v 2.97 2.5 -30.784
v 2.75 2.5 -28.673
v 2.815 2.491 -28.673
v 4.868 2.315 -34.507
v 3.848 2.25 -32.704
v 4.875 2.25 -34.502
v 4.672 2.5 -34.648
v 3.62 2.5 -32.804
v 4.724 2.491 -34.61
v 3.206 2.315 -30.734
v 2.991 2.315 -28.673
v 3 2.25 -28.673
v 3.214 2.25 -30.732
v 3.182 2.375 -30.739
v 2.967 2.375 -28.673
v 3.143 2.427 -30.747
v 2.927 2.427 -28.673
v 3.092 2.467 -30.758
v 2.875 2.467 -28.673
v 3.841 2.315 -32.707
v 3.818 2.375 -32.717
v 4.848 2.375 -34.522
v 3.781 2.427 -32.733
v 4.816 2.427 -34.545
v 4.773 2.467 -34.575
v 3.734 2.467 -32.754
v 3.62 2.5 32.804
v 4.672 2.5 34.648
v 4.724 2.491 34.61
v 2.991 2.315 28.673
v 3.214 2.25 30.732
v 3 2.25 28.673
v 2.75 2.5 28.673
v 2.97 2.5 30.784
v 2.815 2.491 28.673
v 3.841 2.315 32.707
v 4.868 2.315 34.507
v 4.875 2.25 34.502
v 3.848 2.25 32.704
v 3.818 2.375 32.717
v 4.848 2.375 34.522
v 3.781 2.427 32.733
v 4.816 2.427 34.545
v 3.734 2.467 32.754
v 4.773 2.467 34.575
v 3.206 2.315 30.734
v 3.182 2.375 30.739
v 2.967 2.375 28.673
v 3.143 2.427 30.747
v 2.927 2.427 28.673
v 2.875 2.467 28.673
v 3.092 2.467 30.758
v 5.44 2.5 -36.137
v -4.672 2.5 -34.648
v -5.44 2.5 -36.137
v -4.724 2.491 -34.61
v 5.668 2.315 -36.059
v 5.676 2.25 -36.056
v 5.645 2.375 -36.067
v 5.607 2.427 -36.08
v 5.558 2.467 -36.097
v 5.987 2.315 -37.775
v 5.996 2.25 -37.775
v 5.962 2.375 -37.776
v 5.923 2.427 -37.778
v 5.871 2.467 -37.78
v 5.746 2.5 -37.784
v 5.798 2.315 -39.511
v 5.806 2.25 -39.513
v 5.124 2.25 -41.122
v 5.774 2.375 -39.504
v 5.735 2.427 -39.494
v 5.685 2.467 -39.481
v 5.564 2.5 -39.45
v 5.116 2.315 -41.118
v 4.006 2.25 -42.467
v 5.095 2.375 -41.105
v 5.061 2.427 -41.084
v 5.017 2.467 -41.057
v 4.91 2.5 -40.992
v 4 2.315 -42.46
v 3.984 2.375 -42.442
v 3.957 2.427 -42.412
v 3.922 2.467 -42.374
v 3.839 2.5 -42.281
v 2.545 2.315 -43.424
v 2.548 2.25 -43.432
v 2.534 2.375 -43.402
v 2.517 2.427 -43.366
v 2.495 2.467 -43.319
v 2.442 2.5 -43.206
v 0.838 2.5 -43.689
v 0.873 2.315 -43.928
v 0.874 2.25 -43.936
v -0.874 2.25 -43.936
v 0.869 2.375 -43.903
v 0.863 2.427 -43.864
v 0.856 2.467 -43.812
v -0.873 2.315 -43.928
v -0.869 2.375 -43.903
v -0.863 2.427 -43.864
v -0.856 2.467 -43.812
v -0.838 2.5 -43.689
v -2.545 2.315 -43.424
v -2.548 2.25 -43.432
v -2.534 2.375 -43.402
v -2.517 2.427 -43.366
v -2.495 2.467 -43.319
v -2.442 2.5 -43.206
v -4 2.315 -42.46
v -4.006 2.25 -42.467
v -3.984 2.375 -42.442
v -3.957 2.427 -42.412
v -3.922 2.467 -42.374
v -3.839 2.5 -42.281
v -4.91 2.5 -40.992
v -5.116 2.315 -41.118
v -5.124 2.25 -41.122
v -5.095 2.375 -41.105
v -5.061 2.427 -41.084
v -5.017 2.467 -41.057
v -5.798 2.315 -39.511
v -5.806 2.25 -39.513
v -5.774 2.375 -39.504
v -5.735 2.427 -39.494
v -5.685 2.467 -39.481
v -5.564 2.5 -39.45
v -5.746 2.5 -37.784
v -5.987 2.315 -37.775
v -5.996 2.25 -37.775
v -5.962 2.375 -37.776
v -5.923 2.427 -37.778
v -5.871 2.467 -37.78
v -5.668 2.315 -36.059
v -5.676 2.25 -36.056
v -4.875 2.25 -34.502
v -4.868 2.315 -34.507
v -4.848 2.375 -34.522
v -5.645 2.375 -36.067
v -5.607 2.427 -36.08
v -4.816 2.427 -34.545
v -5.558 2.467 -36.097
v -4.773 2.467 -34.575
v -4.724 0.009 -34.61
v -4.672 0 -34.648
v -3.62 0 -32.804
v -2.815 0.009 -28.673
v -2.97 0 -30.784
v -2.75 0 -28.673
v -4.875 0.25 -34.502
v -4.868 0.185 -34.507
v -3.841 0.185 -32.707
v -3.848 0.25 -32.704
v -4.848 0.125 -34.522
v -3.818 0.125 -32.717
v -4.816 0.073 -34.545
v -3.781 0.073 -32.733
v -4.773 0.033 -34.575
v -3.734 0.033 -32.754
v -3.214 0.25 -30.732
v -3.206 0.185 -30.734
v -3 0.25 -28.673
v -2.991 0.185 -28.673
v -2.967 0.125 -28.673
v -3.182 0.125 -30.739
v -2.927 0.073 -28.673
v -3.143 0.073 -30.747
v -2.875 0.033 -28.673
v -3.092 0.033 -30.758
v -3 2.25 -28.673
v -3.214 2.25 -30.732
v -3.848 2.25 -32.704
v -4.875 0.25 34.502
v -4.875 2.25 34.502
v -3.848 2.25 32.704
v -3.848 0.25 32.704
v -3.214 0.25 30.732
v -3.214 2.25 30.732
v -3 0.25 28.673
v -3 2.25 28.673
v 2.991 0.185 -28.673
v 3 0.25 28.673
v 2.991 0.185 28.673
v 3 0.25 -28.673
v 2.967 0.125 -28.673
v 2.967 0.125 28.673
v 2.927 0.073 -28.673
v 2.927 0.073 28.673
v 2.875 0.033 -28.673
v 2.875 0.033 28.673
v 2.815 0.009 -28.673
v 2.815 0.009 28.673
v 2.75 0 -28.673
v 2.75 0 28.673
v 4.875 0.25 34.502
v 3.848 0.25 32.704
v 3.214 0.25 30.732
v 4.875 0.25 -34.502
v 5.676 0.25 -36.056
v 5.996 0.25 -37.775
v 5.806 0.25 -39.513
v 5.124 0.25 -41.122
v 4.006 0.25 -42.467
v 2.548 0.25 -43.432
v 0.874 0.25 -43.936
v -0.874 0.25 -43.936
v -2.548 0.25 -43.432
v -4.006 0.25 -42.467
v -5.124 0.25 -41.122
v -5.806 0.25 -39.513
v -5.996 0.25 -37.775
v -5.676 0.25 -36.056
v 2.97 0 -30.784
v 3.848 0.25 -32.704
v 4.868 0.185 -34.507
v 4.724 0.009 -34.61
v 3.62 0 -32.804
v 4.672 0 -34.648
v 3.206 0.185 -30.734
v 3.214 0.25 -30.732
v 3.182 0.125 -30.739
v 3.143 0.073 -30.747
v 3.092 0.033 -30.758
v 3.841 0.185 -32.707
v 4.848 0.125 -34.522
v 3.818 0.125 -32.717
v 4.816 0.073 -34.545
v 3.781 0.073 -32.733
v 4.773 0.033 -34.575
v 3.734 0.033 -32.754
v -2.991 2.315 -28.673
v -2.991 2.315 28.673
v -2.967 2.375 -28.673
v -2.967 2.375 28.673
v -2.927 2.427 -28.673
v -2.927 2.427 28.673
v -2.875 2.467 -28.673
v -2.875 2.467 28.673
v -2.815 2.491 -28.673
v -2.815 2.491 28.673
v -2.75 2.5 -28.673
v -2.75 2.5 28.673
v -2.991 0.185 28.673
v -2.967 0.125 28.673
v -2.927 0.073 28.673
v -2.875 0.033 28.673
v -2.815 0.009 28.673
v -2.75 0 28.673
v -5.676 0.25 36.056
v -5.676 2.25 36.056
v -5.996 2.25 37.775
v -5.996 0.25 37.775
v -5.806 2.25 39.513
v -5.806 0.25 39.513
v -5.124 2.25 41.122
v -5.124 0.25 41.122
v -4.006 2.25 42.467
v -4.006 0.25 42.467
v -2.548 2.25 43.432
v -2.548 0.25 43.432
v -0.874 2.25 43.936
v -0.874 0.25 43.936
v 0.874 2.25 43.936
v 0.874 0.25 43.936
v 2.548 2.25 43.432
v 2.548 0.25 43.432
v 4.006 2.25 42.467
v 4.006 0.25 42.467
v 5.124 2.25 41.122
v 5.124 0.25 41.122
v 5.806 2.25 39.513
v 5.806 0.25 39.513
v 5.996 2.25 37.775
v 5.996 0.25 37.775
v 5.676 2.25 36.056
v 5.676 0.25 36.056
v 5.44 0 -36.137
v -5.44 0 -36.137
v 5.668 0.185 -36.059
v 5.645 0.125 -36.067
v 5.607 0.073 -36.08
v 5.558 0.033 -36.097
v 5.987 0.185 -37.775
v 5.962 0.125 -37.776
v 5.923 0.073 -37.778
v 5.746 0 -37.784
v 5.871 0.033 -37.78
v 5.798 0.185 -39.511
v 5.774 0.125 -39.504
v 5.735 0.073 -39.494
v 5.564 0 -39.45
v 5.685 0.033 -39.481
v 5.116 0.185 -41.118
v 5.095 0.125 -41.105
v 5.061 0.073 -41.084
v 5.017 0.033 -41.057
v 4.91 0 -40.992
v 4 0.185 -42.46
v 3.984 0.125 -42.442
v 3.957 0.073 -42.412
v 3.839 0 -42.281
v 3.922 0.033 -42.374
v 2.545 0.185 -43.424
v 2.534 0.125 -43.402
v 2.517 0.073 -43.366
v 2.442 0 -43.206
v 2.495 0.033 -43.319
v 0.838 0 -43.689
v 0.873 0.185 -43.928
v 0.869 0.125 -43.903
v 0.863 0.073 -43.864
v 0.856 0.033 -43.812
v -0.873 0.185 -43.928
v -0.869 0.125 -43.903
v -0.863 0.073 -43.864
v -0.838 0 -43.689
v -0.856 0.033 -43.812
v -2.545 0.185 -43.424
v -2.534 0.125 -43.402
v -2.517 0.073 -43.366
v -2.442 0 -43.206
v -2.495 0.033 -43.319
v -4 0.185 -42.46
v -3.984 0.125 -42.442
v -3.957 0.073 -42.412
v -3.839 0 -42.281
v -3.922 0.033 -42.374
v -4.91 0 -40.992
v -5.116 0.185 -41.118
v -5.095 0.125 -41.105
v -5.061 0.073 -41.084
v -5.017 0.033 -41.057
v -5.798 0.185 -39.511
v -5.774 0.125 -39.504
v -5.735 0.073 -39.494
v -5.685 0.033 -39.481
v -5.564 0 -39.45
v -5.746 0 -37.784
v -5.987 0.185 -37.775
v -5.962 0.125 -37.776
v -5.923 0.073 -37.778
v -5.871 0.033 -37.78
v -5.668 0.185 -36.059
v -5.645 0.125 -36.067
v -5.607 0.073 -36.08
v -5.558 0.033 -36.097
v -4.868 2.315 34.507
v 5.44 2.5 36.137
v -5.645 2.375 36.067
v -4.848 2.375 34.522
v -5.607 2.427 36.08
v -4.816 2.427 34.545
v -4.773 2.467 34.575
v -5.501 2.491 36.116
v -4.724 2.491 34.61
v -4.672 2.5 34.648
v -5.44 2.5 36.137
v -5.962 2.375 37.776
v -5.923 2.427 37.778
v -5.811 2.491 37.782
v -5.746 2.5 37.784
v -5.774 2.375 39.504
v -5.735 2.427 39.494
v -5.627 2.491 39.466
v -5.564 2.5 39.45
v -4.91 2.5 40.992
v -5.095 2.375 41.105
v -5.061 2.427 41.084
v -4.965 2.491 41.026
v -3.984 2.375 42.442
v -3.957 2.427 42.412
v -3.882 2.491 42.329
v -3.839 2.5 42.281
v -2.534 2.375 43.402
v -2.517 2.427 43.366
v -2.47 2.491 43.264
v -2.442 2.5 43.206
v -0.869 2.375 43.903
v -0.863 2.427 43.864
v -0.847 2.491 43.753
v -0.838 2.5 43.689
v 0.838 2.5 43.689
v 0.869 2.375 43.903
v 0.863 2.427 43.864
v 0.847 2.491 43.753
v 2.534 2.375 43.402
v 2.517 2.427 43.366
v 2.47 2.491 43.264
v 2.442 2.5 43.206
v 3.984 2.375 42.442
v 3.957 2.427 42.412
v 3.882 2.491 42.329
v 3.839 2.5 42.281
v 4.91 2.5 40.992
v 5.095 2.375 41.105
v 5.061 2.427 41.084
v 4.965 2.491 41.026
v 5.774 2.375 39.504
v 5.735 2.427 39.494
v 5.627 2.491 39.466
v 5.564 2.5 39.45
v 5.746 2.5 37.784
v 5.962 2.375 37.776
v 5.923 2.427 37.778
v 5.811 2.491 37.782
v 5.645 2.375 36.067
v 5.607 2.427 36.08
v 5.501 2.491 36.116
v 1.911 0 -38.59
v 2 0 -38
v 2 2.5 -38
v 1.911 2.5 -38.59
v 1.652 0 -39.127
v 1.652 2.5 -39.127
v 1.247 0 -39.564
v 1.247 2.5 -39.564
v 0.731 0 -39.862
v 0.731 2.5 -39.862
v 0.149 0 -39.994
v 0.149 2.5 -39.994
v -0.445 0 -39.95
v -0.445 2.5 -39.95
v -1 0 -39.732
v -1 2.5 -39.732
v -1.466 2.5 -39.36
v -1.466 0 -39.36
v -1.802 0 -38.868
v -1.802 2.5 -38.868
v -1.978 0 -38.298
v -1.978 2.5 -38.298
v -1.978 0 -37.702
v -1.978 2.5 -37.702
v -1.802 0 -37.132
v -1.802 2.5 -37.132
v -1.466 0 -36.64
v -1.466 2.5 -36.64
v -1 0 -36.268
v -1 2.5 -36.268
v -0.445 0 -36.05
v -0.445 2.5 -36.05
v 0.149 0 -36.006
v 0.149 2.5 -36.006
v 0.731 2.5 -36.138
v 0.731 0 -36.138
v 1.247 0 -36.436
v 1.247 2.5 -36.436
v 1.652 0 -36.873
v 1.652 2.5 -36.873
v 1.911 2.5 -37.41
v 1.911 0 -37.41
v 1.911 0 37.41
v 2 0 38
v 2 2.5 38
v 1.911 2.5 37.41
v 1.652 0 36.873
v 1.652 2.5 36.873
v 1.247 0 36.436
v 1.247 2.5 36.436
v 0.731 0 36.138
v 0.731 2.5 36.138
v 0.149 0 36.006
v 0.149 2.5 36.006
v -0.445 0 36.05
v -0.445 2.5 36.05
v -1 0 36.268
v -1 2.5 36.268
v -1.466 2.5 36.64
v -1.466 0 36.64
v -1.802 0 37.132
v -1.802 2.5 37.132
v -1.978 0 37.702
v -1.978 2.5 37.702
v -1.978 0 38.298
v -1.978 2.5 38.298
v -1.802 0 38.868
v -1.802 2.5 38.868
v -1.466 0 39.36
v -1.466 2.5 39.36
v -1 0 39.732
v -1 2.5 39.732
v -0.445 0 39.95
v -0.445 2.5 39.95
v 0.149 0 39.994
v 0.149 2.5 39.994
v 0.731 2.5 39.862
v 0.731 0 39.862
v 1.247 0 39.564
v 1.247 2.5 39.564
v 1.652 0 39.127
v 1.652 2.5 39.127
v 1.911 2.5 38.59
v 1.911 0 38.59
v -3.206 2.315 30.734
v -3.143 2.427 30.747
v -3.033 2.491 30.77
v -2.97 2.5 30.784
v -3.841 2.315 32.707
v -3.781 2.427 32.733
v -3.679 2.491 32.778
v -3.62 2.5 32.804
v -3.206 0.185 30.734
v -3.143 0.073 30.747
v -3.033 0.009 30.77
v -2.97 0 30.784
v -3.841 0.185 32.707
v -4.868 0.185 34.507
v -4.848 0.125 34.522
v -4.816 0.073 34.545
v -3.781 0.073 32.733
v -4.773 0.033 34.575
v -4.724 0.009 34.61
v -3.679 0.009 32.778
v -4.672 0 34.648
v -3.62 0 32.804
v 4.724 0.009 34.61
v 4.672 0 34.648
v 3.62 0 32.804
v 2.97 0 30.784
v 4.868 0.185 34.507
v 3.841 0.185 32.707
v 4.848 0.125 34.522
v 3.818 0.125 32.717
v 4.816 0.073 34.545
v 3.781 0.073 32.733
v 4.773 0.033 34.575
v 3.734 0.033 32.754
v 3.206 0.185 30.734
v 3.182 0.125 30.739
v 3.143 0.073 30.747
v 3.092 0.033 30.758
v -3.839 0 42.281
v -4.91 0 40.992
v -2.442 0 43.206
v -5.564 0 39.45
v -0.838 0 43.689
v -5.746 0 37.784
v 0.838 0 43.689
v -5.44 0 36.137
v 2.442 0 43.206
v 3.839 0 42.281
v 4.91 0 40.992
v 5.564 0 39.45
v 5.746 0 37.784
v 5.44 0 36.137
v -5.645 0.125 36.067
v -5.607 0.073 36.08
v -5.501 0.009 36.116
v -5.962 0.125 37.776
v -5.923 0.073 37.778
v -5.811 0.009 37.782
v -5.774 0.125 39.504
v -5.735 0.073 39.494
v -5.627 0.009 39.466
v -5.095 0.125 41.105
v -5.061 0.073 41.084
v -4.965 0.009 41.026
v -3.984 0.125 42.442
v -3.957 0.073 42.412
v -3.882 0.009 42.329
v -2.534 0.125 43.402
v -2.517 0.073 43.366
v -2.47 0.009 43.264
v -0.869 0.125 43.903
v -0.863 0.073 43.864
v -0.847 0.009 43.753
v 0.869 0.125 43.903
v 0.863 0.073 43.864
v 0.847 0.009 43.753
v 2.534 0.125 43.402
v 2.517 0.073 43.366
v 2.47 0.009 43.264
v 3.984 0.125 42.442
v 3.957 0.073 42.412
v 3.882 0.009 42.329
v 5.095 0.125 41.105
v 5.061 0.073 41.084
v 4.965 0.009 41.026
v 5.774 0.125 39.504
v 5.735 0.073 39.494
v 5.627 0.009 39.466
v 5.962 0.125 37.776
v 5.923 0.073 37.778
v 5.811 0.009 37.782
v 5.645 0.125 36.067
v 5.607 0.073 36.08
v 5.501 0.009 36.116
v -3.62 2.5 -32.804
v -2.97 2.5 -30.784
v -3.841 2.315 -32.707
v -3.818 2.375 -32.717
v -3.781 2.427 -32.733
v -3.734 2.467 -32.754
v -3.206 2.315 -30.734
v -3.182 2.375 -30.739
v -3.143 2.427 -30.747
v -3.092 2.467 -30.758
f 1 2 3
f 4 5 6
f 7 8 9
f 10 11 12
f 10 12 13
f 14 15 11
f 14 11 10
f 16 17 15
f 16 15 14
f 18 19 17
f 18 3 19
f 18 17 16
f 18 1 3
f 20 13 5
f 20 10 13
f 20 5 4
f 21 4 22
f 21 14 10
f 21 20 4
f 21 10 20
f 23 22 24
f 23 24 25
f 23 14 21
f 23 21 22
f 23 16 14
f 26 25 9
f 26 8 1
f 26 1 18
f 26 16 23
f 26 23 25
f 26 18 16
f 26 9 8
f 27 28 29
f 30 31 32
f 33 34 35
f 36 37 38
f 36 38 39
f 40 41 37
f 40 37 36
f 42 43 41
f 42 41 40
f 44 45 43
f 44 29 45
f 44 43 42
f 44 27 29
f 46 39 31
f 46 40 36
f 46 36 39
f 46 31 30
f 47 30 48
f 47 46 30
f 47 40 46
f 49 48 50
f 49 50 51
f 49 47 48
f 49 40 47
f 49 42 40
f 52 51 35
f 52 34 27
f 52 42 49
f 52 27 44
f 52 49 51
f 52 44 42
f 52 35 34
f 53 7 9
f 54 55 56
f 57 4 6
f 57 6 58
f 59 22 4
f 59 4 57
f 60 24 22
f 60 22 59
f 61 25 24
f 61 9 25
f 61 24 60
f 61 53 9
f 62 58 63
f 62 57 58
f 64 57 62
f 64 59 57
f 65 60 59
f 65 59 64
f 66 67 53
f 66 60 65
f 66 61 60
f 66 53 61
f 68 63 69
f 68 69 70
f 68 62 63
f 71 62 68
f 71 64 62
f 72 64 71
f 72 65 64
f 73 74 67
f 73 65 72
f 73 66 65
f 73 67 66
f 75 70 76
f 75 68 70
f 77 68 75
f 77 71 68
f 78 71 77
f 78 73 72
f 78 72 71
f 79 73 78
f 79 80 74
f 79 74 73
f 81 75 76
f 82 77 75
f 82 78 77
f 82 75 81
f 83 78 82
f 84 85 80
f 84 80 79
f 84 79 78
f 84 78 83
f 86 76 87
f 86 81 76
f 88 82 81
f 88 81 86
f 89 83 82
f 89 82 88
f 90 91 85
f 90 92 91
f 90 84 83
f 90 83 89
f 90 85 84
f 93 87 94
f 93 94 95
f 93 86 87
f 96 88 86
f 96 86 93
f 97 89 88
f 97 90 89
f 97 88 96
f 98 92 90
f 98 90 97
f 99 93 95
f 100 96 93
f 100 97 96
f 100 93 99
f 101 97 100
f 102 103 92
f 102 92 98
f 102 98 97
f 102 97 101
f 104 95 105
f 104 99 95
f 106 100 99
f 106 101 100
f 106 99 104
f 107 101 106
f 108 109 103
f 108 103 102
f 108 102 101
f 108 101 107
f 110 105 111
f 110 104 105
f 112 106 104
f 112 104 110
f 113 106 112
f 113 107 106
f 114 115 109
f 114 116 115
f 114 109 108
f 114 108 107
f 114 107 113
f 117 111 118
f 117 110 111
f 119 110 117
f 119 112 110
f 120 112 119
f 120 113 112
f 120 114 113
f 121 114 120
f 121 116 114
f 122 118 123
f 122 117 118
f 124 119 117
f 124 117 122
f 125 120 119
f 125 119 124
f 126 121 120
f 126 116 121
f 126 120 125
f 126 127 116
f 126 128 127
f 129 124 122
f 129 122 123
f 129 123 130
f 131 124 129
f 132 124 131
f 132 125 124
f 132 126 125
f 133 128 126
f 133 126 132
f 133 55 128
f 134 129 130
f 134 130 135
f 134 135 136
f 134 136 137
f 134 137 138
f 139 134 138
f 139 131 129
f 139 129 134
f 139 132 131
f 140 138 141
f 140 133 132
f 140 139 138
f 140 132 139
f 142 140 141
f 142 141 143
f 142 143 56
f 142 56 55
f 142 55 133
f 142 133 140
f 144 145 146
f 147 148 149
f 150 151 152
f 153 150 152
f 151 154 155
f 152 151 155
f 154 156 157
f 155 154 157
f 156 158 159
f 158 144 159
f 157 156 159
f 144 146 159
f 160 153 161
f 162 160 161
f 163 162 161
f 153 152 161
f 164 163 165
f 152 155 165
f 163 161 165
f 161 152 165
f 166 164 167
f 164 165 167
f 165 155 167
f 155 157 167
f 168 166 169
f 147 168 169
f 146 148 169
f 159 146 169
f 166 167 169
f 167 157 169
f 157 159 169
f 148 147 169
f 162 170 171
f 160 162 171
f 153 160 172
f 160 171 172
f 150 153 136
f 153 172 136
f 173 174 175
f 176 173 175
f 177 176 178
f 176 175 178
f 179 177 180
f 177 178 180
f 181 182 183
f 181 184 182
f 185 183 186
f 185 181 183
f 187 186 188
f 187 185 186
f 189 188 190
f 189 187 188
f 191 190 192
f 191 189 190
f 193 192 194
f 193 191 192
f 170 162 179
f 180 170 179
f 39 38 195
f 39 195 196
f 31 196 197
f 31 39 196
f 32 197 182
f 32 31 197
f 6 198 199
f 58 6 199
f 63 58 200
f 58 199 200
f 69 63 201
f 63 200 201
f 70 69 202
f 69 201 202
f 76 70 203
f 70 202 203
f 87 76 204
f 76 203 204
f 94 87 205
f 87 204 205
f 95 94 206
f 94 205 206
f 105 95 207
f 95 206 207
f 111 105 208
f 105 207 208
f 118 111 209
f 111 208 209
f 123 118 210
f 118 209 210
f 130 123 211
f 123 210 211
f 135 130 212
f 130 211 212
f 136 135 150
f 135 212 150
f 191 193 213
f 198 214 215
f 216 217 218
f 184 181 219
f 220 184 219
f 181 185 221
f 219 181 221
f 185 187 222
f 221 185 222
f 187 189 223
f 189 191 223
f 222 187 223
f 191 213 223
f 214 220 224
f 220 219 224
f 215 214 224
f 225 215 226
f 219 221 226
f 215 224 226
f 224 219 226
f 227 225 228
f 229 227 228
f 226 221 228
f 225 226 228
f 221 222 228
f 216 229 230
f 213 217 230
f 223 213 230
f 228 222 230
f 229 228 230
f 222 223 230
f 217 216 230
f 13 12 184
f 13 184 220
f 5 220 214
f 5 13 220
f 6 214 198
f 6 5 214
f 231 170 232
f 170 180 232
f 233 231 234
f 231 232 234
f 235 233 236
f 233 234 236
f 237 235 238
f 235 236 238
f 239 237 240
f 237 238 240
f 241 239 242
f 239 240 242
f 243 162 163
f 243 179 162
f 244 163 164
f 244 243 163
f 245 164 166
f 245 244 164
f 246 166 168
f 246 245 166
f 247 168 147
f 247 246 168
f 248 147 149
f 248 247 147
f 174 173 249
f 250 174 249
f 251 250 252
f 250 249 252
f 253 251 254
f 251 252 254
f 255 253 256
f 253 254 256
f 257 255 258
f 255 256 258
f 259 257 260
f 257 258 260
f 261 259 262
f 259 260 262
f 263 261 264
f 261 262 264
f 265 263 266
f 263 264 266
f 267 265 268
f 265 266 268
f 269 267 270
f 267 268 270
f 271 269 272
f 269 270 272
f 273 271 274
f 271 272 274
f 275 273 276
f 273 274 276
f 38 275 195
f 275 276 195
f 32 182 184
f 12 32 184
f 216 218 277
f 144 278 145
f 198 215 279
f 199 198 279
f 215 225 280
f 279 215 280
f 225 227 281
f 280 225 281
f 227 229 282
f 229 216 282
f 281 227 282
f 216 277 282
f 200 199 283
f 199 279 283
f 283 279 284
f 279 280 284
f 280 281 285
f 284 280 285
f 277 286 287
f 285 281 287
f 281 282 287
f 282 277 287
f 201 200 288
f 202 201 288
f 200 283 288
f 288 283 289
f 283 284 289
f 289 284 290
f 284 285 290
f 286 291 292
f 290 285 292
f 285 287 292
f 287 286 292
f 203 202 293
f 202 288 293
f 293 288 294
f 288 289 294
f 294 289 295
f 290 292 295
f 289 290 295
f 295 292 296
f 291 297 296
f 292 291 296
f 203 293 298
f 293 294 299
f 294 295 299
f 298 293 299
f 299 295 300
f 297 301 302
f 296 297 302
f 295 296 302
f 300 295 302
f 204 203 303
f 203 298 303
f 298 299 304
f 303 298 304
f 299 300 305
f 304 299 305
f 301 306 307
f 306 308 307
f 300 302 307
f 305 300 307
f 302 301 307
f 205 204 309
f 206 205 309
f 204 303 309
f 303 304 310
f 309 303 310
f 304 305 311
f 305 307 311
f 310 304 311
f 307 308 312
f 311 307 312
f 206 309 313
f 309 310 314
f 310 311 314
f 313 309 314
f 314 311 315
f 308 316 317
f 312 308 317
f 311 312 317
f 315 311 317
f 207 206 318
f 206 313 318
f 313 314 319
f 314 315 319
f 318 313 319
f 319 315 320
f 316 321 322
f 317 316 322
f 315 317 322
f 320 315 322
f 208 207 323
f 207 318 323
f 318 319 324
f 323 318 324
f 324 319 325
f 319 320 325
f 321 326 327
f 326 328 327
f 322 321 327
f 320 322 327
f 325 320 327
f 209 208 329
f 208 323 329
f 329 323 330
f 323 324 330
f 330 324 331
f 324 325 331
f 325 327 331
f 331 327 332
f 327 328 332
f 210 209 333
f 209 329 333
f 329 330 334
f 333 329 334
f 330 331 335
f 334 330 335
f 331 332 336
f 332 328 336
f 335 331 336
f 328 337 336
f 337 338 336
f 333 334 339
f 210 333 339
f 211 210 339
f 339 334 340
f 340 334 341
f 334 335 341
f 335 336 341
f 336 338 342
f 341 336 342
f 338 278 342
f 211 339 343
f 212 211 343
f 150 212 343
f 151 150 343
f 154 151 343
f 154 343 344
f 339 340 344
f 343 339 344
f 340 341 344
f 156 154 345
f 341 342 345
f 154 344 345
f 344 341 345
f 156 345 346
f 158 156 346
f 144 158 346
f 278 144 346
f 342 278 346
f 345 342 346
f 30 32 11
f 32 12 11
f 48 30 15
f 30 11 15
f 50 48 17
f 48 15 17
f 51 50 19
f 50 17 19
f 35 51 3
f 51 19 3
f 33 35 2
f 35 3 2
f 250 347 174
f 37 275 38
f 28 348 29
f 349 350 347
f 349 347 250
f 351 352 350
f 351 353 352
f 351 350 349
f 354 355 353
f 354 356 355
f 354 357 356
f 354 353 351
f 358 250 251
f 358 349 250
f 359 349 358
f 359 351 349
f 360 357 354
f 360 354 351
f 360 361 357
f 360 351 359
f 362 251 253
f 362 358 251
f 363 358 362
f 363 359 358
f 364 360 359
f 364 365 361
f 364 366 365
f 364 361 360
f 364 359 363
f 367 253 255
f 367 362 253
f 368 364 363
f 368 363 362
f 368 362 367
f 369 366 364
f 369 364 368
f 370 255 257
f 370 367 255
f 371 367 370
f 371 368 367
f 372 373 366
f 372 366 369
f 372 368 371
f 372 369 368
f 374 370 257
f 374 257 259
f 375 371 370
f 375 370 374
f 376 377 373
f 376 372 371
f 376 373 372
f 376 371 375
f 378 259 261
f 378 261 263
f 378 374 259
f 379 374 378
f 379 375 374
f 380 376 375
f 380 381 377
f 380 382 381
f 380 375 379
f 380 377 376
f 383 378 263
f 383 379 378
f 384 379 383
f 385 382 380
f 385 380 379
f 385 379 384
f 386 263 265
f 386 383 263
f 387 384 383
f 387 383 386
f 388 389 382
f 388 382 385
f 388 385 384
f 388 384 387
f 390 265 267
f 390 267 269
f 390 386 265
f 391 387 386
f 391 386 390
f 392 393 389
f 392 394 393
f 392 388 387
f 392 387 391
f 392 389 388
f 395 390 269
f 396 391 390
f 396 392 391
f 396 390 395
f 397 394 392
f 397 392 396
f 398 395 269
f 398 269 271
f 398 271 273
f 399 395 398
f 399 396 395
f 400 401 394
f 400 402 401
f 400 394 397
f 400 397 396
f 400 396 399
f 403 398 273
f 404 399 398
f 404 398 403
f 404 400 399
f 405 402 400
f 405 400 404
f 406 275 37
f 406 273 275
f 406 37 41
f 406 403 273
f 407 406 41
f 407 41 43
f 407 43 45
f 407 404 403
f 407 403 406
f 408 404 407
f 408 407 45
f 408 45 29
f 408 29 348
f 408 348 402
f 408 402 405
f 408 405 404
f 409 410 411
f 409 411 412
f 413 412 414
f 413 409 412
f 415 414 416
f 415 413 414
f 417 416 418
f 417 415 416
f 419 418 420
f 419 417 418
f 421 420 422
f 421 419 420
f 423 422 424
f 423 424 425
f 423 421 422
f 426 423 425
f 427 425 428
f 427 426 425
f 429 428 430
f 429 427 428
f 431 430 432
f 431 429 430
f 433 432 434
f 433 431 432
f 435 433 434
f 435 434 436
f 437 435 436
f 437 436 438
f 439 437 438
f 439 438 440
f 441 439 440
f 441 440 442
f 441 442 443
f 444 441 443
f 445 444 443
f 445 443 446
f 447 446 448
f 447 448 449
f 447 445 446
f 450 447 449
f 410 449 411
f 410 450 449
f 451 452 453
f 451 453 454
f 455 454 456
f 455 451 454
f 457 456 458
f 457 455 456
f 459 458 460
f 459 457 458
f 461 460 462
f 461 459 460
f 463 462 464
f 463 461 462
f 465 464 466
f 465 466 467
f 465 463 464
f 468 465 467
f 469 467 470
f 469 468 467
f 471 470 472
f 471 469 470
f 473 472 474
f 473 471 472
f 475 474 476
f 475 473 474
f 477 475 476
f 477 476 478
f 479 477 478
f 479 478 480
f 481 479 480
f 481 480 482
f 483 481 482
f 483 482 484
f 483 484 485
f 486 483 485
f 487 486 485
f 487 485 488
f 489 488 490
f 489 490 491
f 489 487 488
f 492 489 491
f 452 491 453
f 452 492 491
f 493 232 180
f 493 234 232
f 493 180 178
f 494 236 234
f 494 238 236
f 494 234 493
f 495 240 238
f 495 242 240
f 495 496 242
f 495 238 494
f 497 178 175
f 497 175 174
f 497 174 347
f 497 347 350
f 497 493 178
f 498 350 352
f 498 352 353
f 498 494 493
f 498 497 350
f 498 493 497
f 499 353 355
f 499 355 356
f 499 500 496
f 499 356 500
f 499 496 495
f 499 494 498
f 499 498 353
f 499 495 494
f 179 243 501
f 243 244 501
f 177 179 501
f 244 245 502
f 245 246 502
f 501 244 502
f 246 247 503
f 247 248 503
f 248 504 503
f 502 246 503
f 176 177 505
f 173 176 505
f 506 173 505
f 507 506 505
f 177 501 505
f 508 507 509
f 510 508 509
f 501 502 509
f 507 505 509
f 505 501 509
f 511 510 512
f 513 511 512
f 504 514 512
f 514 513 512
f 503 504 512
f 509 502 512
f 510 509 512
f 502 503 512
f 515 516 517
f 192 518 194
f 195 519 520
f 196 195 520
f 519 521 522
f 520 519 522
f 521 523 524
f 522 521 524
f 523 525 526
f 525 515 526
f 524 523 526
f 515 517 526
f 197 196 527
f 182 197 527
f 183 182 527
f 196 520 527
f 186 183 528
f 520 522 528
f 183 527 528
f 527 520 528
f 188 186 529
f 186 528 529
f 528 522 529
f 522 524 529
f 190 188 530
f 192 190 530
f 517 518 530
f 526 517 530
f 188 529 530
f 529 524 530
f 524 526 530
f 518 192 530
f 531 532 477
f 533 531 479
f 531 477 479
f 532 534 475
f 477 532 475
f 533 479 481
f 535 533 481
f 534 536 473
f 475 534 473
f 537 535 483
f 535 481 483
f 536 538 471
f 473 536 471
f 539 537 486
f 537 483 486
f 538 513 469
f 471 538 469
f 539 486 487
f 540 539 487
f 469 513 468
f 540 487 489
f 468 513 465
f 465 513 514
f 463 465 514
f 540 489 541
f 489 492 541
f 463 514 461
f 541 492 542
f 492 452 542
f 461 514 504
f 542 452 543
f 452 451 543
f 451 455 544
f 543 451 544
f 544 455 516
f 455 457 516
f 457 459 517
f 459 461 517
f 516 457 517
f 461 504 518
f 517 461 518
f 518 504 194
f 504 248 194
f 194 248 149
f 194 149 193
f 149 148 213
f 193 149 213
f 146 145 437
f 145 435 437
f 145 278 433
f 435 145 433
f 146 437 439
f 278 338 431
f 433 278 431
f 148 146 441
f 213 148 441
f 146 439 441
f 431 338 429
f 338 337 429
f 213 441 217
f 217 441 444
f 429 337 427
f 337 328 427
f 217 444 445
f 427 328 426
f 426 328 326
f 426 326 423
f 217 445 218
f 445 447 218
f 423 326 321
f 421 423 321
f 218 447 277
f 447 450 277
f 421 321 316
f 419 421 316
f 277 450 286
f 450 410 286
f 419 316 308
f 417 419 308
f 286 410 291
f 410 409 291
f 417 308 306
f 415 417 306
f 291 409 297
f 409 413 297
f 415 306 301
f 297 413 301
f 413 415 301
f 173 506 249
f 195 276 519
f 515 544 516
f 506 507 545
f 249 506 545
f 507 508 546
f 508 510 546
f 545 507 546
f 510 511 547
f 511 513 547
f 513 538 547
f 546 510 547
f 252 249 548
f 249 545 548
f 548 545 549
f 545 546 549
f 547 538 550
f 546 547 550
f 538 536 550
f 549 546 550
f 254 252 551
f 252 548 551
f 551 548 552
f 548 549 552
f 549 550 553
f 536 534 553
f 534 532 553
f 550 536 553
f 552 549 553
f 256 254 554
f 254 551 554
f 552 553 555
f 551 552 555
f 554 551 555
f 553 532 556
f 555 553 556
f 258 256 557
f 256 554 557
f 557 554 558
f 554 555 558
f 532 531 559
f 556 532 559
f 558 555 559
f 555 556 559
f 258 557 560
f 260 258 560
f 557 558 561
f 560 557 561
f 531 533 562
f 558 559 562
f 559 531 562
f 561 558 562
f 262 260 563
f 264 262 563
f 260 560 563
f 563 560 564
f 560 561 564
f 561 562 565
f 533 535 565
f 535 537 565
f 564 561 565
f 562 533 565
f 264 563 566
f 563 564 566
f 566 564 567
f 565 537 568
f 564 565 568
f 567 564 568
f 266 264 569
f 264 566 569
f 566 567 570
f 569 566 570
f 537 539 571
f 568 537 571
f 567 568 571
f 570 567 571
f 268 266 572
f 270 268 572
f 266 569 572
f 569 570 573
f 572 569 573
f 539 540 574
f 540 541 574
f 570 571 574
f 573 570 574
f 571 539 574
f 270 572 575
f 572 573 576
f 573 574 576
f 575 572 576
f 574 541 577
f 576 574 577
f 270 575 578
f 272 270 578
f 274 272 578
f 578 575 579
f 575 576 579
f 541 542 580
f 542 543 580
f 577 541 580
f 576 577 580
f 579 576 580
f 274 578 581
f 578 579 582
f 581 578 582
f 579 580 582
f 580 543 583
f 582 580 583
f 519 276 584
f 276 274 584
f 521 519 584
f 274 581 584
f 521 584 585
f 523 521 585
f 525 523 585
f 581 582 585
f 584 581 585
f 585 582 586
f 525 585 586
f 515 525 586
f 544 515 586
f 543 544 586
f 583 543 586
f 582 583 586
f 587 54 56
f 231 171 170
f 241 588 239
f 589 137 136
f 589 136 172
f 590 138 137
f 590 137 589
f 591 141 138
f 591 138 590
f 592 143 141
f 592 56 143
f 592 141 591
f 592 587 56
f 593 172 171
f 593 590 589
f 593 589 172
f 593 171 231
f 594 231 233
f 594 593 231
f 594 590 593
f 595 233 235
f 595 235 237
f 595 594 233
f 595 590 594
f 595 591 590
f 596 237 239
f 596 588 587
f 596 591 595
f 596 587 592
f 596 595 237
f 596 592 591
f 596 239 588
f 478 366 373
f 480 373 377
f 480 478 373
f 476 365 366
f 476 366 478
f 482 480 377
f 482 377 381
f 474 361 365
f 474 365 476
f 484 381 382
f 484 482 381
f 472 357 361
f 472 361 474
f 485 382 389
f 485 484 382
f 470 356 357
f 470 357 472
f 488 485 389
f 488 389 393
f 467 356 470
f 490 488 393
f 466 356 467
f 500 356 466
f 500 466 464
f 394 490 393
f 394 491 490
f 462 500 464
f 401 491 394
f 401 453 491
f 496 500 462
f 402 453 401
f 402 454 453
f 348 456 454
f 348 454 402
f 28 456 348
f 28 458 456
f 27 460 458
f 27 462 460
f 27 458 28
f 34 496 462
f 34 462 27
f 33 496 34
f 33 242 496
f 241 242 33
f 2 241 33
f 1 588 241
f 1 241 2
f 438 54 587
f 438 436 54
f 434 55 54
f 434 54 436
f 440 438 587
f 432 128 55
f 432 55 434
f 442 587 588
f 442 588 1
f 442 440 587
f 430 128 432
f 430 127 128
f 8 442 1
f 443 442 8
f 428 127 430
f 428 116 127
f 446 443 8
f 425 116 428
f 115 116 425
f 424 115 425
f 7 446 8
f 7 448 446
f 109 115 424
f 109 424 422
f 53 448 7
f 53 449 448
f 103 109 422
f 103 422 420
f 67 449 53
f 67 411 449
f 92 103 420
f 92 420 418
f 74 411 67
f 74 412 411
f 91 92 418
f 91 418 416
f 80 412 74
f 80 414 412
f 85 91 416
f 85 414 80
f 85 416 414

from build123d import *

# Parameters (mm, degrees)
SKETCH1_R           = 2
BOSS_EXTRUDE1_DEPTH = 2.5
FILLET1_R           = 10
FILLET2_R           = 0.25


with BuildPart() as part:
    # Sketch1 → Boss-Extrude1 (new body)
    with BuildSketch(Plane(origin=(0, 0, 0), x_dir=(1, 0, 0), z_dir=(0, 1, 0))):
        with BuildLine():
            ThreePointArc((-3, -32.803847577), (0, -44), (3, -32.803847577))
            Line((3, -32.803847577), (3, 32.803847577))
            ThreePointArc((3, 32.803847577), (0, 44), (-3, 32.803847577))
            Line((-3, 32.803847577), (-3, -32.803847577))
        make_face()
        with Locations((0, -38)):
            Circle(SKETCH1_R, mode=Mode.SUBTRACT)
        with Locations((0, 38)):
            Circle(SKETCH1_R, mode=Mode.SUBTRACT)
    extrude(amount=BOSS_EXTRUDE1_DEPTH)

    # Fillet1
    fillet1_edges = [part.edges().sort_by_distance(p)[0] for p in [
        (-3, 1.25, 32.803847577),
        (-3, 1.25, -32.803847577),
        (3, 1.25, -32.803847577),
        (3, 1.25, 32.803847577),
    ]]
    fillet(fillet1_edges, radius=FILLET1_R)

    # Fillet2
    fillet2_edges = [part.edges().sort_by_distance(p)[0] for p in [
        (0, 0, 44),
        (0, 2.5, 44),
        (-3, 0, 0),
        (-3, 2.5, 0),
        (0, 0, -44),
        (0, 2.5, -44),
        (3, 0, 0),
        (3, 2.5, 0),
        (-3.480283618, 0, 31.734483125),
        (-3.480283618, 2.5, 31.734483125),
        (-3.480283618, 0, -31.734483125),
        (-3.480283618, 2.5, -31.734483125),
        (3.480283618, 0, -31.734483125),
        (3.480283618, 2.5, -31.734483125),
        (3.480283618, 0, 31.734483125),
        (3.480283618, 2.5, 31.734483125),
    ]]
    fillet(fillet2_edges, radius=FILLET2_R)


solid = part.part
